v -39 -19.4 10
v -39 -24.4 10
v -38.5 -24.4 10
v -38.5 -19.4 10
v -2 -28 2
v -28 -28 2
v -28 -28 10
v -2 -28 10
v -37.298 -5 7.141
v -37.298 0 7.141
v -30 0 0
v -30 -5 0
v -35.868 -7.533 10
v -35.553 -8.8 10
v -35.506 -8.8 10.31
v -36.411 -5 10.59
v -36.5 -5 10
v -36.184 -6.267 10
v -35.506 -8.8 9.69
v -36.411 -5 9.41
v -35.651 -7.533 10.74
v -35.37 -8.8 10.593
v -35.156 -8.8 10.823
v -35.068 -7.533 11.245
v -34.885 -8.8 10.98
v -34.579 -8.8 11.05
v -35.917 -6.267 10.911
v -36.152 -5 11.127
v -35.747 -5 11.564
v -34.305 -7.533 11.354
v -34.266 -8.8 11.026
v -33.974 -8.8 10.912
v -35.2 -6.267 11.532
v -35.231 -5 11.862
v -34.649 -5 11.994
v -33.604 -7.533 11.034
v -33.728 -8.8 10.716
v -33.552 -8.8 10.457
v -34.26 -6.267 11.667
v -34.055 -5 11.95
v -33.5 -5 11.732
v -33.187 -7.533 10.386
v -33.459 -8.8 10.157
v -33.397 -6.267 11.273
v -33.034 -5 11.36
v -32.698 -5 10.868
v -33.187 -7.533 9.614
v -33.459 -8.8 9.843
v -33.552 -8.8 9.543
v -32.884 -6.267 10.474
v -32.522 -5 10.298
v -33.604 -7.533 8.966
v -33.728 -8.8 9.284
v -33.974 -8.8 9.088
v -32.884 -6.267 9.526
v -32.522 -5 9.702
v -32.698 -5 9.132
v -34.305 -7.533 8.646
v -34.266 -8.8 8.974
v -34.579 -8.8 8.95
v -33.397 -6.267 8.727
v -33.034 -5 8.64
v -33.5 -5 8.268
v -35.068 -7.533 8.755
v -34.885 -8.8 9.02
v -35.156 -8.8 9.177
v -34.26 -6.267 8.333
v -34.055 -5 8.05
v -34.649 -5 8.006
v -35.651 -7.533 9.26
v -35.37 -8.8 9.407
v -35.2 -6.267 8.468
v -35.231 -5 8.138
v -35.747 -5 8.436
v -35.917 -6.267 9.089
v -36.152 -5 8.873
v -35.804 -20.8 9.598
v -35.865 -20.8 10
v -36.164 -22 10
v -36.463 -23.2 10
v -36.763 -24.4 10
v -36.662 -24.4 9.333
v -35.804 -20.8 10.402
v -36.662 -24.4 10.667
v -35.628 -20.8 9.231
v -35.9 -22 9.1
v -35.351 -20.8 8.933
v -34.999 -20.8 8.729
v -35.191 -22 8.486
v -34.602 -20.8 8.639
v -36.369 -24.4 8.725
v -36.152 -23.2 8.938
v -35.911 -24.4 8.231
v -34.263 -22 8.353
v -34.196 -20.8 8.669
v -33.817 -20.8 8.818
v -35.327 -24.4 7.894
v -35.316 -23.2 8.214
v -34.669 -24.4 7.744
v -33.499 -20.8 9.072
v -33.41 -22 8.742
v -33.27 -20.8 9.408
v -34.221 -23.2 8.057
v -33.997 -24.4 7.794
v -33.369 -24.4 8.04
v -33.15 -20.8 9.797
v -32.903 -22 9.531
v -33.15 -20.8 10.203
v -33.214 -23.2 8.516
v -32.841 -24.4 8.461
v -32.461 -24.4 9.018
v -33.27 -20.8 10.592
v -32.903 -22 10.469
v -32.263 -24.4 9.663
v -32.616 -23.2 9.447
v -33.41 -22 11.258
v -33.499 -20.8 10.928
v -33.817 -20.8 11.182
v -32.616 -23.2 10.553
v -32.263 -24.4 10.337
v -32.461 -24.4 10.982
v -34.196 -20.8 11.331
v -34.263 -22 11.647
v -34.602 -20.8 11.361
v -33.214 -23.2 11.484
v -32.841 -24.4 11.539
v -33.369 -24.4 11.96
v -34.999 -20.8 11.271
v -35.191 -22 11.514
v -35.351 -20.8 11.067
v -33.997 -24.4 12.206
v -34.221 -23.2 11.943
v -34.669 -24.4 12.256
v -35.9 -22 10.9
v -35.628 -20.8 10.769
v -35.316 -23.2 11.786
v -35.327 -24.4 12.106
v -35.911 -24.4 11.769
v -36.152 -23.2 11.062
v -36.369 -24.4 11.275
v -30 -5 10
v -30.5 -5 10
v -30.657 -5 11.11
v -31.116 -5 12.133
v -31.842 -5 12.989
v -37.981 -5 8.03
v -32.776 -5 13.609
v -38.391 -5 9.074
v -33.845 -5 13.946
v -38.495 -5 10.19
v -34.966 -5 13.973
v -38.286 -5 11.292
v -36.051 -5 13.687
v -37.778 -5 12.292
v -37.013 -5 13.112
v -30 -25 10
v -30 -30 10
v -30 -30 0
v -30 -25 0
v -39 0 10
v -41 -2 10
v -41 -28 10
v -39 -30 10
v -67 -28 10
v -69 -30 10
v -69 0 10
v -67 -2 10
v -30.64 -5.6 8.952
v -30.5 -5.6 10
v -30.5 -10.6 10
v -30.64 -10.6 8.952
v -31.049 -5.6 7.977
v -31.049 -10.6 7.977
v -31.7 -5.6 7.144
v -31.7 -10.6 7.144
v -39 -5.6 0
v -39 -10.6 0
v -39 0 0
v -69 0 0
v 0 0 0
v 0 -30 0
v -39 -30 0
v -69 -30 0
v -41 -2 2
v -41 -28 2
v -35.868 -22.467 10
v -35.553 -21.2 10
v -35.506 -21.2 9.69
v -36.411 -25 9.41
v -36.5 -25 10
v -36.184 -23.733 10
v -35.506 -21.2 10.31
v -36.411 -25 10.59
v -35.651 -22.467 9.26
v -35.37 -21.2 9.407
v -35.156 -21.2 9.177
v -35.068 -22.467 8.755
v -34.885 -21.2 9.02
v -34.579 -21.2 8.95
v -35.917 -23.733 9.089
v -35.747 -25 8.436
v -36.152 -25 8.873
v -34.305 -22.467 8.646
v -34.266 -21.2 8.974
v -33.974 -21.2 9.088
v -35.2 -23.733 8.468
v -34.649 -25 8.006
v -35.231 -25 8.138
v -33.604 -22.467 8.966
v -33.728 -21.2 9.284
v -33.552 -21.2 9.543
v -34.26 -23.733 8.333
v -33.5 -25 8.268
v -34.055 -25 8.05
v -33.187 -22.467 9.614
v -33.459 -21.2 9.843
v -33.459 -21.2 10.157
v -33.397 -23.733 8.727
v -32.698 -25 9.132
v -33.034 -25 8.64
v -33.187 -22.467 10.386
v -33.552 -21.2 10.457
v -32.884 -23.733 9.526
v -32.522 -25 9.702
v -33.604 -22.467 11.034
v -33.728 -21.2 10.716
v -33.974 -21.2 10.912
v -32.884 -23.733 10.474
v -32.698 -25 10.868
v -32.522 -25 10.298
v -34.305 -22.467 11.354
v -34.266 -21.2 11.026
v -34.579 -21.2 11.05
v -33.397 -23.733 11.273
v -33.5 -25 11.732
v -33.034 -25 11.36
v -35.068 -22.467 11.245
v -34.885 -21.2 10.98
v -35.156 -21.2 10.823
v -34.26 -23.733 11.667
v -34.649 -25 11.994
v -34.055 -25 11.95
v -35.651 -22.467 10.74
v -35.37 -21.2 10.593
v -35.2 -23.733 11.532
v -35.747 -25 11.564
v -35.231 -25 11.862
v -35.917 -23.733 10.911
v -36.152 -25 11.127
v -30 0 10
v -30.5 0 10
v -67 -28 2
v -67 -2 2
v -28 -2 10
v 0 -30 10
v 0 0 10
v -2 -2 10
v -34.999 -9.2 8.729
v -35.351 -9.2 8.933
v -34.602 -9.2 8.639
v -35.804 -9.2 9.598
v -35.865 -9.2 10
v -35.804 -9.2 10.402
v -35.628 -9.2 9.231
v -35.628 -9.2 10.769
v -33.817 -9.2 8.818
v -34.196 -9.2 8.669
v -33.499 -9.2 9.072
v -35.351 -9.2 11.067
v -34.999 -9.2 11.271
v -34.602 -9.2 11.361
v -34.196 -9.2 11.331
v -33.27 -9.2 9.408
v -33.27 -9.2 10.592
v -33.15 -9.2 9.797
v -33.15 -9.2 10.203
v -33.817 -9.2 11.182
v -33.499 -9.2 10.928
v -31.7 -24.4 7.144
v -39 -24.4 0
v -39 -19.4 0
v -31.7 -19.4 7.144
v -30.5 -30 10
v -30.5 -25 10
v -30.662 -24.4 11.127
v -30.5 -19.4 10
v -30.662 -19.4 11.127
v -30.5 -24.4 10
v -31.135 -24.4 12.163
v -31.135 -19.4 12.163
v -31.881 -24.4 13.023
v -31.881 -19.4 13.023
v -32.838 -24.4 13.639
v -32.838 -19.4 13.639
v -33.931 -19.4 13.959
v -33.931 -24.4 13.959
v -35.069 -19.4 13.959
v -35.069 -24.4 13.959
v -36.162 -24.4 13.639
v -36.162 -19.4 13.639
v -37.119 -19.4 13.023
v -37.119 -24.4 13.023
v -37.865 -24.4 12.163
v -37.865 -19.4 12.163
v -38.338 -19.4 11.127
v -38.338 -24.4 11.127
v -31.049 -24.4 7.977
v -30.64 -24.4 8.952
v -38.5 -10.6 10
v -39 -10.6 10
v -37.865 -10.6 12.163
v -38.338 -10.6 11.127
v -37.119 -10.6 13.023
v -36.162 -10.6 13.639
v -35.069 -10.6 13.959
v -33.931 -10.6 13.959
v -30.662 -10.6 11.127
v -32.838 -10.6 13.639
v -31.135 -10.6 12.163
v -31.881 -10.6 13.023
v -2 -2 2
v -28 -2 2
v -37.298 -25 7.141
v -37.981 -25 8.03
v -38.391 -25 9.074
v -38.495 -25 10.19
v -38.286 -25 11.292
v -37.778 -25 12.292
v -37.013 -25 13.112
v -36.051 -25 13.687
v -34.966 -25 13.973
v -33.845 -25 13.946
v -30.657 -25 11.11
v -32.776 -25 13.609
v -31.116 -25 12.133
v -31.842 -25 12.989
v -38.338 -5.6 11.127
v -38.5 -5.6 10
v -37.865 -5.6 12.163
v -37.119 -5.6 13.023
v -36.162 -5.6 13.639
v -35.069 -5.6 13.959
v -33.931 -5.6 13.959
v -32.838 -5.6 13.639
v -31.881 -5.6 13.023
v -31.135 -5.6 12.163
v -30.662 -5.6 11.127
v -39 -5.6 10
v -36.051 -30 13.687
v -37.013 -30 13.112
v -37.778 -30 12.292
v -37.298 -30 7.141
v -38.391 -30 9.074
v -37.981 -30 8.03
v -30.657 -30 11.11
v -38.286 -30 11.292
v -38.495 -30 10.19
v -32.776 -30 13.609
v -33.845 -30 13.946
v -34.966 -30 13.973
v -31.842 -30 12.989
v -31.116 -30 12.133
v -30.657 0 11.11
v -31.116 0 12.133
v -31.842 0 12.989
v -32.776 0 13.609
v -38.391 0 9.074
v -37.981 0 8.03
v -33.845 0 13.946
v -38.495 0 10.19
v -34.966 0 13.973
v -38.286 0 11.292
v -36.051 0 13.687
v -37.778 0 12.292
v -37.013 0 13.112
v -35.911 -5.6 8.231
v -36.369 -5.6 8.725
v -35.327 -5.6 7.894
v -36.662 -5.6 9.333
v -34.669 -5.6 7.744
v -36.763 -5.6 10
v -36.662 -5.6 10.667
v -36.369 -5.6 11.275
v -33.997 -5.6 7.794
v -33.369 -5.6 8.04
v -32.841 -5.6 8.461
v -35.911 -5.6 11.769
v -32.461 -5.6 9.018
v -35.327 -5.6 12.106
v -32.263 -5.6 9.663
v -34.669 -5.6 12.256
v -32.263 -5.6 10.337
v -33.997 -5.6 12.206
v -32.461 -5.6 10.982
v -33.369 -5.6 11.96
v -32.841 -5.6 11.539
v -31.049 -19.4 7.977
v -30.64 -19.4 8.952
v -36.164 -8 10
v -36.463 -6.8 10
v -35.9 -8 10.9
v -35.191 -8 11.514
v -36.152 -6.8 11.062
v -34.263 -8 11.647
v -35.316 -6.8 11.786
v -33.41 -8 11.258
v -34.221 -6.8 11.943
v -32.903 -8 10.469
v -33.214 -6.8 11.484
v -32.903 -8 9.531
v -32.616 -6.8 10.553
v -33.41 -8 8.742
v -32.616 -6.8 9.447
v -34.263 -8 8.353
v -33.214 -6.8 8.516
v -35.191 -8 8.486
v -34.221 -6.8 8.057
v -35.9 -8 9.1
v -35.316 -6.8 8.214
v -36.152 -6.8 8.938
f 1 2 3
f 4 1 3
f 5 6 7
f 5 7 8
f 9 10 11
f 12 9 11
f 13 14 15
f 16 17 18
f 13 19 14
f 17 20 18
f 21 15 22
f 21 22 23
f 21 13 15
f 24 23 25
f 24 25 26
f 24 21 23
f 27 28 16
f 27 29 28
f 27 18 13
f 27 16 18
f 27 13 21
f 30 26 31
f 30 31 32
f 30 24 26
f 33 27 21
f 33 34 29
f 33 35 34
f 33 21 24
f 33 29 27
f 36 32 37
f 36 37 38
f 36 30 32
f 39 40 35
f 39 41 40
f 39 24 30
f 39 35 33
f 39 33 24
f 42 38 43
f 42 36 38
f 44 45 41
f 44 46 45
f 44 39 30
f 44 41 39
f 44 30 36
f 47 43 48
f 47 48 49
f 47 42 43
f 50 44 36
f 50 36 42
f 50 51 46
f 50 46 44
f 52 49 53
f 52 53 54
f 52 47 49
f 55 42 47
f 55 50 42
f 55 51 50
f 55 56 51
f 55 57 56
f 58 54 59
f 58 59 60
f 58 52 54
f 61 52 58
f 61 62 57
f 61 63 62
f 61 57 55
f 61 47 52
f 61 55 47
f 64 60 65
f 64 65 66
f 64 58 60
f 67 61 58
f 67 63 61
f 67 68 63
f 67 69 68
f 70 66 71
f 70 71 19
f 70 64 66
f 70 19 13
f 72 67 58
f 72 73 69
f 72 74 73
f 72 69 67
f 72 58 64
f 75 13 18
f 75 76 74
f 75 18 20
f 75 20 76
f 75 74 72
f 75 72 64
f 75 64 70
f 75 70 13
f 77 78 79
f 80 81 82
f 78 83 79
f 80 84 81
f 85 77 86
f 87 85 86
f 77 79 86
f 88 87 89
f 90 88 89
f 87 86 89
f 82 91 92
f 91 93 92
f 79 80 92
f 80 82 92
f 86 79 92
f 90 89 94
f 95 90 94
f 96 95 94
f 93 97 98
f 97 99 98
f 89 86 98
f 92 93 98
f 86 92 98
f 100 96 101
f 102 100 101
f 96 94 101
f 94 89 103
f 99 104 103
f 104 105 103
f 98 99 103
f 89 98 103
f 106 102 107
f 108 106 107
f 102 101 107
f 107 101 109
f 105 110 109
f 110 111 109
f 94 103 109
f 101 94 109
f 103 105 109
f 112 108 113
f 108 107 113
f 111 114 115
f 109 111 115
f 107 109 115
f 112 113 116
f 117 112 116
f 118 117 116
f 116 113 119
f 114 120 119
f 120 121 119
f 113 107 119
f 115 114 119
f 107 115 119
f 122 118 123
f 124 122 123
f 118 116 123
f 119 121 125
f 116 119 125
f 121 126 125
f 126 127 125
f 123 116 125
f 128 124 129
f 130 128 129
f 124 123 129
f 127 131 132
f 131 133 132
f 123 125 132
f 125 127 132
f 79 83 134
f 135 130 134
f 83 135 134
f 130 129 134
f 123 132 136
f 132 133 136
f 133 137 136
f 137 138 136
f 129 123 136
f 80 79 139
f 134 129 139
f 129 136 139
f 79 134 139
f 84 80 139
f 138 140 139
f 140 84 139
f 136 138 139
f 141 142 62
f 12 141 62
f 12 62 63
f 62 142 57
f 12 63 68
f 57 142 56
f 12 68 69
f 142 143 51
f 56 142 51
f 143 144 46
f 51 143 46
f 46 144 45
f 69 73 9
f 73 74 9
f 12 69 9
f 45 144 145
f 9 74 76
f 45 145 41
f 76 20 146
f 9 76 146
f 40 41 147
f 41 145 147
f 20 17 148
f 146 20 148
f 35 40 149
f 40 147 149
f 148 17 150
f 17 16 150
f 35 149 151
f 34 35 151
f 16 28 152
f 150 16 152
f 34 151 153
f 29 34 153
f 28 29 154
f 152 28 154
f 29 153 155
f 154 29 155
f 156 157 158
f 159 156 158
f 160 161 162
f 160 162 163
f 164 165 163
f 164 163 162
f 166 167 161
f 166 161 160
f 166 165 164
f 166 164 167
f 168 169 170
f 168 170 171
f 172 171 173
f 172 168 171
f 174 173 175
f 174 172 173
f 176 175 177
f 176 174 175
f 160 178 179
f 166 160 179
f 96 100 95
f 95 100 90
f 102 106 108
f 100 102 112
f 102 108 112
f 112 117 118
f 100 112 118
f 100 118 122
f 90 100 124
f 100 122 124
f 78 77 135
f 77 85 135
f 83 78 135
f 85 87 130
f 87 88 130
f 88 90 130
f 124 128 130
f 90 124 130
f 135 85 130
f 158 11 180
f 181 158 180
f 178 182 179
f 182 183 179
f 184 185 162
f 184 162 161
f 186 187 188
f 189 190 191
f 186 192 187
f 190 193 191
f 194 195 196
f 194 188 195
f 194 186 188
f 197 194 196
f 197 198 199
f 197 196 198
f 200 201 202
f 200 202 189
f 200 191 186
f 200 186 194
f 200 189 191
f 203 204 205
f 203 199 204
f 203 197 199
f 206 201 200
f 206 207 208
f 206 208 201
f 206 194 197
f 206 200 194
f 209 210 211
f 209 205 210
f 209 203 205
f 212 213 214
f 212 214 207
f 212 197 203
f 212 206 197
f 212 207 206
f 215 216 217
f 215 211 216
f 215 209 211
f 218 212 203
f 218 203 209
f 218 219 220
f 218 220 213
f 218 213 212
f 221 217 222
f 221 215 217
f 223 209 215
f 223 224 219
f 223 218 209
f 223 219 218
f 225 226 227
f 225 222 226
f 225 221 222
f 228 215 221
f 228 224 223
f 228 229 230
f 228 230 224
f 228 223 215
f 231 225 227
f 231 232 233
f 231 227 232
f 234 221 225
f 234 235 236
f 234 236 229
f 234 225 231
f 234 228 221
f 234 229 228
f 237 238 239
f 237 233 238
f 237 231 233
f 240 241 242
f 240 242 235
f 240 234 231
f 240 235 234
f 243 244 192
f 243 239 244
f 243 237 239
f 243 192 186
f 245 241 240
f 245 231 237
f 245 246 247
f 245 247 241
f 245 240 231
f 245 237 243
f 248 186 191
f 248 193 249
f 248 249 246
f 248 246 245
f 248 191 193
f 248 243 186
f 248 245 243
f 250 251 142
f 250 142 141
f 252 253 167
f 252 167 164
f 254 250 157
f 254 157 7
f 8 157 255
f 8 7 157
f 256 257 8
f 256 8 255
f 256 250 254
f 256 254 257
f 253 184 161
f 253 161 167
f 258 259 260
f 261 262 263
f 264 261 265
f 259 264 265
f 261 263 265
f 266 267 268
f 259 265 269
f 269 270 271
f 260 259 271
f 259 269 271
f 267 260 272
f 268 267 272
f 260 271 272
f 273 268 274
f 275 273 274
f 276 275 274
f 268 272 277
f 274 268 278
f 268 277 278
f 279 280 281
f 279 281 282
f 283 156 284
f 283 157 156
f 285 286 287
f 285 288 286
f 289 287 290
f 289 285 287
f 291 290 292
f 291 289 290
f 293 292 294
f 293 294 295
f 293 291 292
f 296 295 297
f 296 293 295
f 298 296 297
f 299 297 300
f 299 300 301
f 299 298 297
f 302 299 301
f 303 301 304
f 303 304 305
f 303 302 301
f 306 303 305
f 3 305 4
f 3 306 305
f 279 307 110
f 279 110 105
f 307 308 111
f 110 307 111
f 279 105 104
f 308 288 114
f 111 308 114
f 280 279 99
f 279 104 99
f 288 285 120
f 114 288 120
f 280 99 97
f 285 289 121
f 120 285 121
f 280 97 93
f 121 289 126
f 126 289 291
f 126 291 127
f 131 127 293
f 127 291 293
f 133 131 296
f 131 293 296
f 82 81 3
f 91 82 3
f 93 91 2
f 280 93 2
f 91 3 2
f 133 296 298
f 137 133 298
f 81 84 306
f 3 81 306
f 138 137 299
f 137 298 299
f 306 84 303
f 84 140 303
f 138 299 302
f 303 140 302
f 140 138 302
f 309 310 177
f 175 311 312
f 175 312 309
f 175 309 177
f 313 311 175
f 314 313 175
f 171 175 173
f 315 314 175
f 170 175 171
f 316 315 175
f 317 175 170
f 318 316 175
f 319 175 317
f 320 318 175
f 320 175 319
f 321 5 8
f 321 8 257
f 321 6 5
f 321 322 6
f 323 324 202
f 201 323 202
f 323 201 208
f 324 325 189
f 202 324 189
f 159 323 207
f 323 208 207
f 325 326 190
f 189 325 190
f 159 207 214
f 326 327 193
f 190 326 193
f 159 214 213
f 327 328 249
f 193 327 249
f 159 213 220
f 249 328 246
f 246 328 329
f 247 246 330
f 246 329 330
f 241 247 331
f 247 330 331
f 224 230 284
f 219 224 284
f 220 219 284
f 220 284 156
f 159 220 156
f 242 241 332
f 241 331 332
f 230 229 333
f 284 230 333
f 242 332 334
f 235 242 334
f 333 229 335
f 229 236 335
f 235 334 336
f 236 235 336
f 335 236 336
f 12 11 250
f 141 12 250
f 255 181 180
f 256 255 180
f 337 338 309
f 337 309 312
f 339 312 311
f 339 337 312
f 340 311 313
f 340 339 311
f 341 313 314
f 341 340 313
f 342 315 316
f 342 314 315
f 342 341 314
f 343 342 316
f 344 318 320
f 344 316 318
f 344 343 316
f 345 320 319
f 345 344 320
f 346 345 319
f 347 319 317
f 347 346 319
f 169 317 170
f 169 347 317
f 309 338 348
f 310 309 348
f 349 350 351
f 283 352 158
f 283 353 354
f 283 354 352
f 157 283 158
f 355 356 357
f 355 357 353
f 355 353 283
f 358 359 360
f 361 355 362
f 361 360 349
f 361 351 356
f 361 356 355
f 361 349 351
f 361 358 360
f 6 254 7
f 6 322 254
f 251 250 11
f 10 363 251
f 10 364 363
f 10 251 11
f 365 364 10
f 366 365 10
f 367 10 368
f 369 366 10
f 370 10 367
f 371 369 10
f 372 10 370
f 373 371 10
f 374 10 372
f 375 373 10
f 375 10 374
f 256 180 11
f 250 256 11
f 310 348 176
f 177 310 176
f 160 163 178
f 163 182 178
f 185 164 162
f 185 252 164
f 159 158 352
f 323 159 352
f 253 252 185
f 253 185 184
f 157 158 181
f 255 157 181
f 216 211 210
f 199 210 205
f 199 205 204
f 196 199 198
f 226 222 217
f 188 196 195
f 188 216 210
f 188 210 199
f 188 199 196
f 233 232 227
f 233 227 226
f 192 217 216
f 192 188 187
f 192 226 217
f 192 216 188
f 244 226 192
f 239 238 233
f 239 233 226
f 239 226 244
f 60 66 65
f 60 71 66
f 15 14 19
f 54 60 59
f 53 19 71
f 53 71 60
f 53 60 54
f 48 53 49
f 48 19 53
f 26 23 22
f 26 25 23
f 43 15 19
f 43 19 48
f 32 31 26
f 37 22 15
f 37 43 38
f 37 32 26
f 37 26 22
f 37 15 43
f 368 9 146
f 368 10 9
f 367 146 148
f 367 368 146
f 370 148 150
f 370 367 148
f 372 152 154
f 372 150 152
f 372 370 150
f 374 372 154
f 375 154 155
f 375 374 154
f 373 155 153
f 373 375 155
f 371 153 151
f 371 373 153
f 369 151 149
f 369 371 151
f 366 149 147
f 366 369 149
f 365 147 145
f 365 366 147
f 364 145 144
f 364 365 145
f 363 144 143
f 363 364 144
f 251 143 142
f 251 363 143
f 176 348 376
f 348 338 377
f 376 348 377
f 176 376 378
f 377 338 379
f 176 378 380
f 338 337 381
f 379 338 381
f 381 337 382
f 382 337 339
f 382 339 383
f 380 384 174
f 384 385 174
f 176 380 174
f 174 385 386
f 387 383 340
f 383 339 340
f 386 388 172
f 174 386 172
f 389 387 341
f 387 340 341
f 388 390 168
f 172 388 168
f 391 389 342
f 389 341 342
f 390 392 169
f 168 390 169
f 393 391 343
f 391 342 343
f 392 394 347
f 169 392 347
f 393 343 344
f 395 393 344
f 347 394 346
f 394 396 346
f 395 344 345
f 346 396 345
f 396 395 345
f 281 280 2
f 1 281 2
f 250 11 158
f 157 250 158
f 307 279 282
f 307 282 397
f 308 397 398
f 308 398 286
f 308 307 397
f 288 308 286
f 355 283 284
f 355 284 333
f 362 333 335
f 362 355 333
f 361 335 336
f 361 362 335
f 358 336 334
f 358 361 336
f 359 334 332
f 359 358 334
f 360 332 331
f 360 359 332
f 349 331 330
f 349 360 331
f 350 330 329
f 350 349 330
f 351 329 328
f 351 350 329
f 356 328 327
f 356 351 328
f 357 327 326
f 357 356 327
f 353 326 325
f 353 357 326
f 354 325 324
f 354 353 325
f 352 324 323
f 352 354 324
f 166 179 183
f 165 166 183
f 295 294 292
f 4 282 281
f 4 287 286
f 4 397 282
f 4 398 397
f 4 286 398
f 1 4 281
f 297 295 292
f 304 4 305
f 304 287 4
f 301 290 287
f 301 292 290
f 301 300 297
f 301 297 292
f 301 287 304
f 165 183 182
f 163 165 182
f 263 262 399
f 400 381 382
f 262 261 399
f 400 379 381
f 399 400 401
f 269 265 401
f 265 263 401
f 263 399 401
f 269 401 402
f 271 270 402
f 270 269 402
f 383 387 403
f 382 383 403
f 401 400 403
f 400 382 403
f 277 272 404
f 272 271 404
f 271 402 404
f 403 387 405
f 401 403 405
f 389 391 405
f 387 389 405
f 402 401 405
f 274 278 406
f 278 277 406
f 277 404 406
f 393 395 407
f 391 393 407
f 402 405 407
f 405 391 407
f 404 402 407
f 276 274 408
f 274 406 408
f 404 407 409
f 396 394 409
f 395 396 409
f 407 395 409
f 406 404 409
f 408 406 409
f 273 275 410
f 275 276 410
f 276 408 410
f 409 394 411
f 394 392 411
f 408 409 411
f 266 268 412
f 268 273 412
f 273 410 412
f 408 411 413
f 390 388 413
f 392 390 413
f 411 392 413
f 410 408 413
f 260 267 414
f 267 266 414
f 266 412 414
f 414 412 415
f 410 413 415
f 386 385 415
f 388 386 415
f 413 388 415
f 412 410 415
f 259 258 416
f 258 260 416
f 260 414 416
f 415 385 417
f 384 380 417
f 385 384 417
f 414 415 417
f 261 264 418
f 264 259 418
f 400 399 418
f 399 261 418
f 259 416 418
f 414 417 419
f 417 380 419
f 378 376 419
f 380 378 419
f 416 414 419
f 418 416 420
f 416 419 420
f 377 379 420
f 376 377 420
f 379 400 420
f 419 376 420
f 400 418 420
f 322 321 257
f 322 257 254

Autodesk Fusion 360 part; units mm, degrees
sketch "Box Width" plane through (0, 0, 0) normal (0, 0, 1) x (1, 0, 0) in component "BoxTop"
  line L0 (0, 0) -> (-30, 0)
  line L1 (-30, 0) -> (-30, -30)
  line L2 (-30, -30) -> (0, -30)
  line L3 (0, -30) -> (0, 0)
  dimension "d3_1" = 30
  dimension "d4_1" = 30
extrude "Extrude1" add sketch "Box Width" along normal blind 10 makes body 1 in component "BoxTop"
shell "Shell1" thickness 2 removed faces 1 at (-20, -10, 10) on bodies 1 in component "BoxTop"
sketch "Box Width (2)" plane through (0, 0, 0) normal (0, 0, 1) x (1, 0, 0) in component "BoxBottom (1)"
  line L0 (0, 0) -> (-30, 0)
  line L1 (-30, 0) -> (-30, -30)
  line L2 (-30, -30) -> (0, -30)
  line L3 (0, -30) -> (0, 0)
  dimension "d3_2" = 30
  dimension "d4_2" = 30
extrude "Extrude1'" add sketch "Box Width (2)" along normal blind 10 separate body makes body 2 in component "BoxBottom (1)"
shell "Shell1'" thickness 2 removed faces 1 at (-20, -10, 10) on bodies 2 in component "BoxBottom (1)"
sketch "Sketch1" plane through (0, -30, 0) normal (0, -1, 0) x (1, 0, 0)
  line L0 (-30, 0) -> (0, 0)
  line L1 (0, 0) -> (0, 10)
  line L2 (0, 10) -> (-30, 10)
  line L3 (-30, 10) -> (-30, 0)
  line L4 (-30, 10) -> (-34.5, 10)
  circle A0 centre (-34.5, 10) radius 4
  line L5 (-30, 0) -> (-37.2976, 7.1411)
  dimension "d5" = 4.5
  dimension "d6" = 8
extrude "Extrude1''" add sketch "Sketch1" against normal blind 5 separate body contours L3 L4 A0 L5 | A0 makes body 3
sketch "Sketch2" plane through (0, -25, 0) normal (0, 1, 0) x (-1, 0, 0)
  line L0 (30.5, 10) -> (30, 10)
  line L1 (30, 10) -> (30, 0)
  line L2 (30, 0) -> (37.2976, 7.1411)
  arc A0 (37.2976, 7.1411) -> (30.5, 10) centre (34.5, 10) ccw
  arc A1 (37.2976, 7.1411) -> (30.5, 10) centre (34.5, 10) ccw
  circle A2 centre (34.5, 10) radius 2
  dimension "d9" = 4
extrude "Extrude2" add sketch "Sketch2" along normal blind 3.8 draft -14 contours A2 bodies 3
sketch "Sketch3" plane through (0, -25, 0) normal (0, 1, 0) x (-1, 0, 0)
  circle A0 centre (34.5, 10) radius 2
  line L0 (30.5, 10) -> (30, 10)
  line L1 (30, 10) -> (30, 0)
  line L2 (30, 0) -> (37.2976, 7.1411)
  arc A1 (37.2976, 7.1411) -> (30.5, 10) centre (34.5, 10) ccw
  line L3 (39, 10) -> (38.5, 10)
  circle A2 centre (34.5, 10) radius 4
  line L4 (39, 0) -> (31.7024, 7.1411)
  line L5 (39, 0) -> (39, 10)
extrude "Extrude3" add sketch "Sketch3" along normal blind 5 from surface at 0.6 separate body contours A0 | A1 A2 | L2 A1 L3 A2 L4 L5 | L2 A2 L4 makes body 4
combine "Combine1" operation cut target body 4 tool bodies 3 keep tools
move_face "OffsetFaces1" offset -0.4 2 faces at (-34.2272, -21.2, 10.3421) (-34.3717, -23.8667, 11.7126) on bodies 4
ref_plane "WorkPlane1" through (-15, -15, 5) normal (0, -1, 0) x (1, 0, 0)
mirror "Mirror1" about plane through (-15, -15, 5) normal (0, -1, 0) of bodies 4 makes body 5
mirror "Mirror2" about plane through (-15, -15, 5) normal (0, -1, 0) of bodies 3 makes body 6
component "BoxTop" placed x (0, 1, 0) y (-1, 0, 0) z (0, 0, 1) at (-69, 0, 0)
component "BoxBottom (1)" placed x (1, 0, 0) y (0, 1, 0) z (0, 0, 1) at (0, 0, 0)
equation "d3_1 = Boxwidth_1"
equation "d4_1 = Boxwidth_1"
equation "d5_1 = Boxheight_1 / 2"
equation "Wallthickness_1 = 2 mm"
equation "Boxwidth_1 = 30 mm"
equation "Boxheight_1 = 20 mm"
equation "d3_2 = Boxwidth_2"
equation "d4_2 = Boxwidth_2"
equation "d5_2 = Boxheight_2 / 2"
equation "Wallthickness_2 = 2 mm"
equation "Boxwidth_2 = 30 mm"
equation "Boxheight_2 = 20 mm"
